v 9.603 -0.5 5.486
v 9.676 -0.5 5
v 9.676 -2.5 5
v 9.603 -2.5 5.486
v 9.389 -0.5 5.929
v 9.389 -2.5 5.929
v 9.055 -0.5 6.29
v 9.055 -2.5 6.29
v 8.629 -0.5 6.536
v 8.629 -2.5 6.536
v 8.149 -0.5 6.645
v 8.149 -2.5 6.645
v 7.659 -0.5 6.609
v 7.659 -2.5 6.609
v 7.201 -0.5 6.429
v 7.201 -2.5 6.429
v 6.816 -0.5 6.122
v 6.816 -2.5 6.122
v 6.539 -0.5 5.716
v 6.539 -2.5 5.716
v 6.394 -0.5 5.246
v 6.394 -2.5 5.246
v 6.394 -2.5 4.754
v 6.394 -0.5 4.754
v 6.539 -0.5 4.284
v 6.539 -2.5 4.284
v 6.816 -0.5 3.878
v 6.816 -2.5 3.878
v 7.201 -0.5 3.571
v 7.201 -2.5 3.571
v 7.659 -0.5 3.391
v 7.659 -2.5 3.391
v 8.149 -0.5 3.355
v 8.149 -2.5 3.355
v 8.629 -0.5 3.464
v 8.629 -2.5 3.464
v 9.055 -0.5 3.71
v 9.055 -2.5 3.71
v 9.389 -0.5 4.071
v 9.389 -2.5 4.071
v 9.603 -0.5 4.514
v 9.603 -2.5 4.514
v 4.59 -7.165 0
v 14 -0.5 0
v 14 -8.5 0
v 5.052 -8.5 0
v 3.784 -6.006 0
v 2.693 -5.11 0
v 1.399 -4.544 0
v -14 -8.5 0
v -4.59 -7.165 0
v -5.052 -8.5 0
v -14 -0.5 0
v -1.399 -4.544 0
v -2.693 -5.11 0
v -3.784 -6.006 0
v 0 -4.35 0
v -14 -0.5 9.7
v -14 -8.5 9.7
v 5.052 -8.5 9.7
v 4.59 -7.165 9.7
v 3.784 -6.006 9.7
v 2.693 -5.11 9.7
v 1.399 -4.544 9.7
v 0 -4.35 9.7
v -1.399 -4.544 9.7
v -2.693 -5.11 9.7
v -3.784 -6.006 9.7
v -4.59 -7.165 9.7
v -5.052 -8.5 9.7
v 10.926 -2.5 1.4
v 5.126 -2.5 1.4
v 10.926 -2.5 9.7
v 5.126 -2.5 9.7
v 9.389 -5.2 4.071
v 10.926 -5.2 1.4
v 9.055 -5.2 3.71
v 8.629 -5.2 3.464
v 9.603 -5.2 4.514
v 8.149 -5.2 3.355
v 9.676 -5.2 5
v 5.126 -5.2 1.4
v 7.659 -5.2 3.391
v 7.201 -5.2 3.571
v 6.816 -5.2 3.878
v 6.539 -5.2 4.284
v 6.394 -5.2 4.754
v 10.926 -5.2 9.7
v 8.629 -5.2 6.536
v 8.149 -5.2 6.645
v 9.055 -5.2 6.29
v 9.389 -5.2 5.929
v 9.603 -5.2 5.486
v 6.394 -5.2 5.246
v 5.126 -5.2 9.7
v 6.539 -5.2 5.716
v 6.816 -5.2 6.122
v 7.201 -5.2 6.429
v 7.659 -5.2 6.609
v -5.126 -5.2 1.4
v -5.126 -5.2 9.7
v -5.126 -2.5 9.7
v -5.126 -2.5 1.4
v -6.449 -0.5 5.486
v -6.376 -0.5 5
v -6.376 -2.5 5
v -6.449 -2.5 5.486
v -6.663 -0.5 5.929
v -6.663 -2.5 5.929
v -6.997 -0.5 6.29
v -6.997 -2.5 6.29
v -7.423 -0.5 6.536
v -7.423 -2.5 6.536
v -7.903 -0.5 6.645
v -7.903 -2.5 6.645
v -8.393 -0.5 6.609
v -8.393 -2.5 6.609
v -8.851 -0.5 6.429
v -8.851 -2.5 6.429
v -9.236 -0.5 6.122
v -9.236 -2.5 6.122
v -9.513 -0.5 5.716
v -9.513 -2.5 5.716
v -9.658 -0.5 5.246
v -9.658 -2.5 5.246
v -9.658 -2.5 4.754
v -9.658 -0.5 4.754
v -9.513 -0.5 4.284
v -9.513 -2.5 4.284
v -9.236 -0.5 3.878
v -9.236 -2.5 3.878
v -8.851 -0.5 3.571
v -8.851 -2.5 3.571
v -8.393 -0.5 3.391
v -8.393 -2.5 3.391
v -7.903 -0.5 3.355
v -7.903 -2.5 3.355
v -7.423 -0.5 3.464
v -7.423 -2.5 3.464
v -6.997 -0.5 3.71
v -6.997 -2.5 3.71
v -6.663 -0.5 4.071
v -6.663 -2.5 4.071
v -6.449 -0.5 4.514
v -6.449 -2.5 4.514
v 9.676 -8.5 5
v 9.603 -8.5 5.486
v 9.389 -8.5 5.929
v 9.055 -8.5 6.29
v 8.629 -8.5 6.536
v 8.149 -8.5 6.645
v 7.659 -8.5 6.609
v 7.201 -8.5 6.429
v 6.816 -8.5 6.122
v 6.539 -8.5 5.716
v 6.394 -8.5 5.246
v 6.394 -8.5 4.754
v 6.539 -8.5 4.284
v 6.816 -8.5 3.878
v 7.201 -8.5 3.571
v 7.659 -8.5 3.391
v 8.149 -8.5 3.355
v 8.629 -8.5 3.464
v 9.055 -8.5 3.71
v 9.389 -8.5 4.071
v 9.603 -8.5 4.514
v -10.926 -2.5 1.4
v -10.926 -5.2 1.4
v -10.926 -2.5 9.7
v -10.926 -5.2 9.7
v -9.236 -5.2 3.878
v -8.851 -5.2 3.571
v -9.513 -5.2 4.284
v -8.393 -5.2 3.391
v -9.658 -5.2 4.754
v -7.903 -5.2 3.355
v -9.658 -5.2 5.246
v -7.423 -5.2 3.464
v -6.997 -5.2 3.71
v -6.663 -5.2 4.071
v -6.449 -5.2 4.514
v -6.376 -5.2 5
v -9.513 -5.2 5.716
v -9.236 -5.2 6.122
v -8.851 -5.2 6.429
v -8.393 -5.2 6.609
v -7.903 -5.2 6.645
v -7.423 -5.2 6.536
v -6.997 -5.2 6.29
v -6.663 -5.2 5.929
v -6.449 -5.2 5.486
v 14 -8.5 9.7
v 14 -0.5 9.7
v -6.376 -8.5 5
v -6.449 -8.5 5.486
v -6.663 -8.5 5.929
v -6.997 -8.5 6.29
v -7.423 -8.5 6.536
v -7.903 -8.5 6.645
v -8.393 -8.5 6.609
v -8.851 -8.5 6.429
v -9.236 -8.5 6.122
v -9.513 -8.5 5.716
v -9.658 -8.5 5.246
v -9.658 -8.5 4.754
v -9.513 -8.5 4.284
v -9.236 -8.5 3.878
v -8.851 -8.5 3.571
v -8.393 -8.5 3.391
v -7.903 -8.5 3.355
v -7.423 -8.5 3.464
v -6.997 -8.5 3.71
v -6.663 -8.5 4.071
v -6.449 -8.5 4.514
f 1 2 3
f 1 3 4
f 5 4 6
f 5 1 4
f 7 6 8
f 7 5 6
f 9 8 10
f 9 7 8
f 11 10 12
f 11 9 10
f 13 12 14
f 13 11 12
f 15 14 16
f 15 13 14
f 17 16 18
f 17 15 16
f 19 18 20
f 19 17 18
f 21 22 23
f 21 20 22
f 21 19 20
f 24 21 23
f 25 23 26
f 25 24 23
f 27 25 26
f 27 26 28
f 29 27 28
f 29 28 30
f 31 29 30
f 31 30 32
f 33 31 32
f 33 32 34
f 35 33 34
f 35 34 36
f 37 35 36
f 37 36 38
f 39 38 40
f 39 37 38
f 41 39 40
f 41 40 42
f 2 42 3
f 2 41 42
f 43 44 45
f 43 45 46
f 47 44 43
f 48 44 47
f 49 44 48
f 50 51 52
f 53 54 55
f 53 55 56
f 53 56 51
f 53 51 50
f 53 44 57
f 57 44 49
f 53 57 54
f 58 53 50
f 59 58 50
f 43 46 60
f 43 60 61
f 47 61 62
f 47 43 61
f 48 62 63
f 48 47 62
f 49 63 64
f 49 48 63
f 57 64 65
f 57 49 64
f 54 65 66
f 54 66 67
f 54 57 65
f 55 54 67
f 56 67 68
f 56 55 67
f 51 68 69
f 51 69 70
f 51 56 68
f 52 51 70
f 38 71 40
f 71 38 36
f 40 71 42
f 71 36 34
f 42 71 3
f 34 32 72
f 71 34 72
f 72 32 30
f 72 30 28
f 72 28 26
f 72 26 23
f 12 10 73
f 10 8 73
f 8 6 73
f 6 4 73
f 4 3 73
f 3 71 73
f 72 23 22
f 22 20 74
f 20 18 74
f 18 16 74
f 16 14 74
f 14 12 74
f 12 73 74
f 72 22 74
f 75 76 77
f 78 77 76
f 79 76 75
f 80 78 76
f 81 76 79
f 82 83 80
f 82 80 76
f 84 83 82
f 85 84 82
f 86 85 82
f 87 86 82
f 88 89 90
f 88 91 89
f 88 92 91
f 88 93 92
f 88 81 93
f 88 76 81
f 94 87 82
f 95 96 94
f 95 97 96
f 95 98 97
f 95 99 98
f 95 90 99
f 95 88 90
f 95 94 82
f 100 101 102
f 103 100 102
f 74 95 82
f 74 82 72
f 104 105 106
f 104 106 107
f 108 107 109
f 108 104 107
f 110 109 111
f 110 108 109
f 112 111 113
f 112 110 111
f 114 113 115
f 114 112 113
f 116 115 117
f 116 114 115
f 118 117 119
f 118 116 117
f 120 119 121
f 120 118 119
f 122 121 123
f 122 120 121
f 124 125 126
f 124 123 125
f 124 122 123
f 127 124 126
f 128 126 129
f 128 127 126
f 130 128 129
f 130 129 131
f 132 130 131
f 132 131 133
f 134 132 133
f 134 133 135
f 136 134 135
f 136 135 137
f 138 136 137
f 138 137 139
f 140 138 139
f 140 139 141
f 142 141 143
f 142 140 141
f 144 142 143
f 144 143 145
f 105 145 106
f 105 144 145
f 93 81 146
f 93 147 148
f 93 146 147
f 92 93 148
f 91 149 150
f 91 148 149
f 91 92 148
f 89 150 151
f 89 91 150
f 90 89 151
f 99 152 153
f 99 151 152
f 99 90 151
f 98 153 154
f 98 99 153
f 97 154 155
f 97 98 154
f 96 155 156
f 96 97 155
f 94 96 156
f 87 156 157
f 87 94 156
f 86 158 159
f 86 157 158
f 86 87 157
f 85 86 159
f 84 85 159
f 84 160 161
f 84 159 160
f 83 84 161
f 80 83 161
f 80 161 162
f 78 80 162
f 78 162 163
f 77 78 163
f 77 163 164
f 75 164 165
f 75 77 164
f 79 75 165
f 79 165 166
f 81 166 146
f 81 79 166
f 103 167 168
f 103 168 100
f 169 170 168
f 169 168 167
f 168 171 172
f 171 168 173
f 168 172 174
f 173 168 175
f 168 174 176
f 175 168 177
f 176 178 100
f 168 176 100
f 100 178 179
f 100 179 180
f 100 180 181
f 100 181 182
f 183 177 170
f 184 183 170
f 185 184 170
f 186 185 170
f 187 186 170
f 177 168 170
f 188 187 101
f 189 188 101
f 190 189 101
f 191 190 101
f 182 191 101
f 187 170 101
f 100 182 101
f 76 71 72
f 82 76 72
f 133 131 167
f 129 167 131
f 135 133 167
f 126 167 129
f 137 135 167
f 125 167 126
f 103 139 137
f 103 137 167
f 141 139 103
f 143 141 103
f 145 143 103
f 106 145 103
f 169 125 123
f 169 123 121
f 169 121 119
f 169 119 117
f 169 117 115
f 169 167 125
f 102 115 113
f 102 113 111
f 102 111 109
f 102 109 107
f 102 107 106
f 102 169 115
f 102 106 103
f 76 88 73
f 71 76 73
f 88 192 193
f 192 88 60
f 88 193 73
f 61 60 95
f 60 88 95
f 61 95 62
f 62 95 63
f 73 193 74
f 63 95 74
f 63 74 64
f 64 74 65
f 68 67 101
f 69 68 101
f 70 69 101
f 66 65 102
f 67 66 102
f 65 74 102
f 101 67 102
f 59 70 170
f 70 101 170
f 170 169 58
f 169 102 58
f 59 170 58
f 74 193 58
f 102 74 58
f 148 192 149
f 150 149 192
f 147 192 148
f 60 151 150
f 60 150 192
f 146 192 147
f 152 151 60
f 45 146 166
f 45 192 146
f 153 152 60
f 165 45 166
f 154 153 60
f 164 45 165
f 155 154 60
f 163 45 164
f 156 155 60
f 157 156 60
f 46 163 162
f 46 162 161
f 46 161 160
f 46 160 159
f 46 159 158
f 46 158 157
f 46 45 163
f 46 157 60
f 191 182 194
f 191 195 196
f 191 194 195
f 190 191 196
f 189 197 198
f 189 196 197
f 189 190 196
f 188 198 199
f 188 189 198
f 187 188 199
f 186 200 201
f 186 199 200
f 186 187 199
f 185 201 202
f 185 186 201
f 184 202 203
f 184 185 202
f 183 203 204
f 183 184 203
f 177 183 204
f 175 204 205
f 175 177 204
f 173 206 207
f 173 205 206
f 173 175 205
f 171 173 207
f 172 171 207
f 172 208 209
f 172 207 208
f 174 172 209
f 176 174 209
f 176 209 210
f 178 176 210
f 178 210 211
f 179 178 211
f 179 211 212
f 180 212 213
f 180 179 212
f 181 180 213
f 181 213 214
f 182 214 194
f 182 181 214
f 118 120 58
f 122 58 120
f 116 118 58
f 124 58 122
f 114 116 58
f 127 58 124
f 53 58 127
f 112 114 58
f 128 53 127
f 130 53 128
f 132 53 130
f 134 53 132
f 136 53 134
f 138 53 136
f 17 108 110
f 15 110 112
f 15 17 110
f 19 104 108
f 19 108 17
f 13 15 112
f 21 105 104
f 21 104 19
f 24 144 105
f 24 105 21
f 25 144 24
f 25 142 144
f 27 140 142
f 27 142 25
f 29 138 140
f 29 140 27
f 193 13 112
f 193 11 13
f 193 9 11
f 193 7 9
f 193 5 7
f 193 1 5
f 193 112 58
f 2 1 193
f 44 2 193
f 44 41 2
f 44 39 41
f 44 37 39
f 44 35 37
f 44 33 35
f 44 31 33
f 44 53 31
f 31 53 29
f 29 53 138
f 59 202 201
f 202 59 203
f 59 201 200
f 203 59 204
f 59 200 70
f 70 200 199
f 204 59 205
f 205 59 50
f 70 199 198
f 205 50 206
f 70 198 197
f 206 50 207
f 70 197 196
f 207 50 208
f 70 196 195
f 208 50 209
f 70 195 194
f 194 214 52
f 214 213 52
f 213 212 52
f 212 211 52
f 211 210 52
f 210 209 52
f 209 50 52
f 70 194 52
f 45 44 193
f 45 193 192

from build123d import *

# Parameters (mm, degrees)
PAD016_DEPTH         = 9.7
SKETCH041_R          = 1.65
POCKET014_DEPTH      = 0.001
POCKET014_DEPTH_BACK = 8.501
SKETCH042_W          = 5.8
SKETCH042_H          = 2.7
POCKET015_DEPTH      = 8.3


with BuildPart() as part:
    # Sketch040 → Pad016 (new body)
    with BuildSketch(Plane.XY):
        with BuildLine():
            ThreePointArc((5.05198, -8.5), (0, -4.35), (-5.05198, -8.5))
            Line((-14, -8.5), (-5.05198, -8.5))
            Line((-14, -0.5), (-14, -8.5))
            Line((-14, -0.5), (14, -0.5))
            Line((14, -0.5), (14, -8.5))
            Line((14, -8.5), (5.05198, -8.5))
        make_face()
    extrude(amount=PAD016_DEPTH)

    # Sketch041 → Pocket014 (cut, two sides)
    with BuildSketch(Plane.XZ) as pocket014_sk:
        with Locations((-8.02599, 5)):
            Circle(SKETCH041_R)
        with Locations((8.02599, 5)):
            Circle(SKETCH041_R)
    extrude(amount=-POCKET014_DEPTH, mode=Mode.SUBTRACT)
    extrude(pocket014_sk.sketch, amount=POCKET014_DEPTH_BACK, mode=Mode.SUBTRACT)

    # Sketch042 (on Face4 of Pocket014) → Pocket015 (cut)
    with BuildSketch(Plane.XY.offset(9.7)):
        with Locations((-8.02599, -3.85)):
            Rectangle(SKETCH042_W, SKETCH042_H)
    pocket015 = extrude(amount=-POCKET015_DEPTH, mode=Mode.SUBTRACT)

    # Mirrored001: Pocket015 across Sketch042 V_Axis
    add(pocket015.mirror(Plane(origin=(0, 0, 9.7), x_dir=(0, 0, 1), z_dir=(1, 0, 0))), mode=Mode.SUBTRACT)


solid = part.part
